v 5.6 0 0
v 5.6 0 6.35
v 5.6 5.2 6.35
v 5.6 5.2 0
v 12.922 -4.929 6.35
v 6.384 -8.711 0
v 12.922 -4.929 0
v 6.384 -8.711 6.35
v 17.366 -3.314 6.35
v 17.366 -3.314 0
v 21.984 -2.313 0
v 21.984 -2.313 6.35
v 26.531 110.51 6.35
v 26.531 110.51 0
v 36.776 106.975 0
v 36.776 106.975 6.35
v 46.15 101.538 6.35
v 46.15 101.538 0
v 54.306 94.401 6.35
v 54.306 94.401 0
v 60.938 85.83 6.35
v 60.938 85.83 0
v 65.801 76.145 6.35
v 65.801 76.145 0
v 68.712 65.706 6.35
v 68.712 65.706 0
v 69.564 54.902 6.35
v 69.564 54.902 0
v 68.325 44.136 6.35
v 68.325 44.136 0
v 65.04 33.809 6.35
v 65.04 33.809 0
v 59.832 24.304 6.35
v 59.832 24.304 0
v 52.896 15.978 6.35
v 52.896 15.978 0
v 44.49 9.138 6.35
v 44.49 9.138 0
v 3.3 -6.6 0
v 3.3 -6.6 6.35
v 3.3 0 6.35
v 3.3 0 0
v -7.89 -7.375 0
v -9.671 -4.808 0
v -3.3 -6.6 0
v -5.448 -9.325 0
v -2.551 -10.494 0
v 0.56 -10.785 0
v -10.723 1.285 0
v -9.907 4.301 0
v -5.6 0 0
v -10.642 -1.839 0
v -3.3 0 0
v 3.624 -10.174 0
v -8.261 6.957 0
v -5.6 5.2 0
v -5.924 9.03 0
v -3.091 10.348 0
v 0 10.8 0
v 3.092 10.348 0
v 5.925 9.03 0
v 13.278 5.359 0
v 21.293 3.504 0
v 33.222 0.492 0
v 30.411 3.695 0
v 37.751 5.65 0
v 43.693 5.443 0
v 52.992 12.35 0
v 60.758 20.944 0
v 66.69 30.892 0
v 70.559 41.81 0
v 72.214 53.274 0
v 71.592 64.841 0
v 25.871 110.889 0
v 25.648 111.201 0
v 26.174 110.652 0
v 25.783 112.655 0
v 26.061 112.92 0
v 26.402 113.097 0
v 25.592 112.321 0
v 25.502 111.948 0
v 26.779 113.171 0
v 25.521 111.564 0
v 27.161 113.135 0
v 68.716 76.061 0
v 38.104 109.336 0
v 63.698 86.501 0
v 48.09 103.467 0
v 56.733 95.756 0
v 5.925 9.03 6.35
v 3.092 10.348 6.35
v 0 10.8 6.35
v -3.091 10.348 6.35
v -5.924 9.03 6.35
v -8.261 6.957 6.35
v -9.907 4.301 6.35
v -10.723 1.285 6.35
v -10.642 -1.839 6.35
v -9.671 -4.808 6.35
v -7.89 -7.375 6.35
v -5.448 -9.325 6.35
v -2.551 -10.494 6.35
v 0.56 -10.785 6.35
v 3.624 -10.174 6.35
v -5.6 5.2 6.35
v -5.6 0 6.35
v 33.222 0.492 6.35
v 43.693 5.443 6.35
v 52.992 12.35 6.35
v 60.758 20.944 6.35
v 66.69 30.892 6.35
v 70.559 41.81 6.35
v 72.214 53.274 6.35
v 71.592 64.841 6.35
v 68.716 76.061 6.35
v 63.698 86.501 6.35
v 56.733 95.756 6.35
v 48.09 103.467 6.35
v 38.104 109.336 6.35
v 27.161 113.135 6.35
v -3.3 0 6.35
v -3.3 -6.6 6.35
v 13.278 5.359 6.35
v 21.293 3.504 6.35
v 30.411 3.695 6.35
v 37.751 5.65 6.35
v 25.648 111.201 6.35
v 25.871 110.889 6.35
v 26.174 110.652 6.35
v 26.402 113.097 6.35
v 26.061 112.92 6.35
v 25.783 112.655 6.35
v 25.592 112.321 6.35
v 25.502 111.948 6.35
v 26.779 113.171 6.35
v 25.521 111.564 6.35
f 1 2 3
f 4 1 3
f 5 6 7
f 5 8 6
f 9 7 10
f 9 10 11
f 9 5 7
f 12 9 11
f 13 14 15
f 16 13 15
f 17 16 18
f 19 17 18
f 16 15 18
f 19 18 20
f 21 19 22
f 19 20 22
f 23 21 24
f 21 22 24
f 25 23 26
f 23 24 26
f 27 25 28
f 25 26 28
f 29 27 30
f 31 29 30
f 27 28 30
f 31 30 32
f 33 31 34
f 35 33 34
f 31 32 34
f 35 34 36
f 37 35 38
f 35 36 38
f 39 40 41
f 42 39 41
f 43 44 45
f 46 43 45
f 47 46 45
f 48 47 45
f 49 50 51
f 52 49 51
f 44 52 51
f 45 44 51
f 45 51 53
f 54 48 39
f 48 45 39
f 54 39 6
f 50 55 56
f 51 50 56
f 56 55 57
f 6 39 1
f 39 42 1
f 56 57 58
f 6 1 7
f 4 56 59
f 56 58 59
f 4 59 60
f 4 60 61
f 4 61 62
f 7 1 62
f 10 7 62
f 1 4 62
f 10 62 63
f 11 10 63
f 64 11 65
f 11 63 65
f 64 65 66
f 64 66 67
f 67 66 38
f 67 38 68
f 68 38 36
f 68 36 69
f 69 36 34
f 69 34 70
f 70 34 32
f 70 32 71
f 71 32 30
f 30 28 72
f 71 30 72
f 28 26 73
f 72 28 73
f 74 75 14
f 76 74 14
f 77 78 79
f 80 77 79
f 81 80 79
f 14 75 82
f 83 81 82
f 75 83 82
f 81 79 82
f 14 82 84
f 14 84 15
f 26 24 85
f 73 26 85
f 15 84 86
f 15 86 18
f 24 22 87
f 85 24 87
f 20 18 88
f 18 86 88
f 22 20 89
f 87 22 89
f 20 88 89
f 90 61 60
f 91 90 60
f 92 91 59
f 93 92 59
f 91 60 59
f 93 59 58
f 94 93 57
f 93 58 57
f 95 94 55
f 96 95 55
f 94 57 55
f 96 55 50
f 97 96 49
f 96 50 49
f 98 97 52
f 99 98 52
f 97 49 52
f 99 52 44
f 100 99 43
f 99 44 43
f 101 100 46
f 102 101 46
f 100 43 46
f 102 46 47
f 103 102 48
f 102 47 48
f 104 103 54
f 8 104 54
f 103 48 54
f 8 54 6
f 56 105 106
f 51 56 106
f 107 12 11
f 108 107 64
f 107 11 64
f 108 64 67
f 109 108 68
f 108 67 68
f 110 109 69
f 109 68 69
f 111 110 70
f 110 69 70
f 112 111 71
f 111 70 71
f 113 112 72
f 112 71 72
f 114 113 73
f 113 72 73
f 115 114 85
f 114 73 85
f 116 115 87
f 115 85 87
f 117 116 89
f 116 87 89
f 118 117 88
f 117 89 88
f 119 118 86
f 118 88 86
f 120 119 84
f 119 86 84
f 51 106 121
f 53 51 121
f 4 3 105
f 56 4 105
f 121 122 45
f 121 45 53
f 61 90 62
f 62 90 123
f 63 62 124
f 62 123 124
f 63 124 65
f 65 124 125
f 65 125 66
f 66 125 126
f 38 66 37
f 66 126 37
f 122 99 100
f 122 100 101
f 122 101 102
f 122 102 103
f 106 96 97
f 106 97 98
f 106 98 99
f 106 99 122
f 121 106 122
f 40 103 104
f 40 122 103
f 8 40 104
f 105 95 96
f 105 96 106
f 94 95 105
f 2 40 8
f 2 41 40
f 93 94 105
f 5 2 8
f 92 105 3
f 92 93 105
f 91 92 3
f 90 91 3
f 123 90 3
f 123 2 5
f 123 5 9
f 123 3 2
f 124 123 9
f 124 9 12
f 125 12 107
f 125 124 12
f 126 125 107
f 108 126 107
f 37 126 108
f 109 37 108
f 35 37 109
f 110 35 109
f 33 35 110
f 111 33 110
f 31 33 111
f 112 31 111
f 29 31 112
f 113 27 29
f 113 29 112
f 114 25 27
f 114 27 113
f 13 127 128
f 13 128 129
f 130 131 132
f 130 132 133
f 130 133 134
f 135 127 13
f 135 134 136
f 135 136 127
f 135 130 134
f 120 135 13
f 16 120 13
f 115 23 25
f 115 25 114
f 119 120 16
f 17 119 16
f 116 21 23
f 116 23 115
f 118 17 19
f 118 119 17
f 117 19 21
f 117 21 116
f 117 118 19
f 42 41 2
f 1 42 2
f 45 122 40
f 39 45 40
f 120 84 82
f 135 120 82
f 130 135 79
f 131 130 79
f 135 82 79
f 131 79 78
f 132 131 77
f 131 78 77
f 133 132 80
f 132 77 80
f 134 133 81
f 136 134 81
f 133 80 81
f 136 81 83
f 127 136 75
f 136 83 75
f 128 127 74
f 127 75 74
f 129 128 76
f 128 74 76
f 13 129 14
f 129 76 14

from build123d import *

# Parameters (mm, degrees)
BOSS_EXTRUDE2_DEPTH = 6.35
FILLET1_R           = 35
CUT_EXTRUDE1_DEPTH  = 135.431204491


with BuildPart() as part:
    # Sketch1 → Boss-Extrude2 (new body)
    with BuildSketch(Plane.XY):
        with BuildLine():
            ThreePointArc((10.798543624, -0.177357298), (-10.690836494, 1.531670676), (10.413952601, -2.861746185))
            ThreePointArc((10.413952601, -2.861746185), (71.669169509, 47.501819321), (27.161368085, 113.135240238))
            ThreePointArc((27.161368085, 113.135240238), (25.533517451, 112.137692087), (26.531065602, 110.509841453))
            ThreePointArc((26.531065602, 110.509841453), (69.014379057, 48.009806686), (10.798543624, -0.177357298))
        make_face()
    extrude(amount=BOSS_EXTRUDE2_DEPTH)

    # Fillet1
    fillet1_edges = [part.edges().sort_by_distance(p)[0] for p in [
        (10.413952601, -2.861746185, 3.175),
        (10.798543624, -0.177357298, 3.175),
    ]]
    fillet(fillet1_edges, radius=FILLET1_R)

    # Sketch2 → Cut-Extrude1 (cut, through all)
    with BuildSketch(Plane.XY.offset(6.35)):
        Polygon((-5.6, 0), (-3.3, 0), (-3.3, -6.6), (3.3, -6.6), (3.3, 0), (5.6, 0), (5.6, 5.2), (-5.6, 5.2), align=None)
    extrude(amount=-CUT_EXTRUDE1_DEPTH, mode=Mode.SUBTRACT)


solid = part.part
